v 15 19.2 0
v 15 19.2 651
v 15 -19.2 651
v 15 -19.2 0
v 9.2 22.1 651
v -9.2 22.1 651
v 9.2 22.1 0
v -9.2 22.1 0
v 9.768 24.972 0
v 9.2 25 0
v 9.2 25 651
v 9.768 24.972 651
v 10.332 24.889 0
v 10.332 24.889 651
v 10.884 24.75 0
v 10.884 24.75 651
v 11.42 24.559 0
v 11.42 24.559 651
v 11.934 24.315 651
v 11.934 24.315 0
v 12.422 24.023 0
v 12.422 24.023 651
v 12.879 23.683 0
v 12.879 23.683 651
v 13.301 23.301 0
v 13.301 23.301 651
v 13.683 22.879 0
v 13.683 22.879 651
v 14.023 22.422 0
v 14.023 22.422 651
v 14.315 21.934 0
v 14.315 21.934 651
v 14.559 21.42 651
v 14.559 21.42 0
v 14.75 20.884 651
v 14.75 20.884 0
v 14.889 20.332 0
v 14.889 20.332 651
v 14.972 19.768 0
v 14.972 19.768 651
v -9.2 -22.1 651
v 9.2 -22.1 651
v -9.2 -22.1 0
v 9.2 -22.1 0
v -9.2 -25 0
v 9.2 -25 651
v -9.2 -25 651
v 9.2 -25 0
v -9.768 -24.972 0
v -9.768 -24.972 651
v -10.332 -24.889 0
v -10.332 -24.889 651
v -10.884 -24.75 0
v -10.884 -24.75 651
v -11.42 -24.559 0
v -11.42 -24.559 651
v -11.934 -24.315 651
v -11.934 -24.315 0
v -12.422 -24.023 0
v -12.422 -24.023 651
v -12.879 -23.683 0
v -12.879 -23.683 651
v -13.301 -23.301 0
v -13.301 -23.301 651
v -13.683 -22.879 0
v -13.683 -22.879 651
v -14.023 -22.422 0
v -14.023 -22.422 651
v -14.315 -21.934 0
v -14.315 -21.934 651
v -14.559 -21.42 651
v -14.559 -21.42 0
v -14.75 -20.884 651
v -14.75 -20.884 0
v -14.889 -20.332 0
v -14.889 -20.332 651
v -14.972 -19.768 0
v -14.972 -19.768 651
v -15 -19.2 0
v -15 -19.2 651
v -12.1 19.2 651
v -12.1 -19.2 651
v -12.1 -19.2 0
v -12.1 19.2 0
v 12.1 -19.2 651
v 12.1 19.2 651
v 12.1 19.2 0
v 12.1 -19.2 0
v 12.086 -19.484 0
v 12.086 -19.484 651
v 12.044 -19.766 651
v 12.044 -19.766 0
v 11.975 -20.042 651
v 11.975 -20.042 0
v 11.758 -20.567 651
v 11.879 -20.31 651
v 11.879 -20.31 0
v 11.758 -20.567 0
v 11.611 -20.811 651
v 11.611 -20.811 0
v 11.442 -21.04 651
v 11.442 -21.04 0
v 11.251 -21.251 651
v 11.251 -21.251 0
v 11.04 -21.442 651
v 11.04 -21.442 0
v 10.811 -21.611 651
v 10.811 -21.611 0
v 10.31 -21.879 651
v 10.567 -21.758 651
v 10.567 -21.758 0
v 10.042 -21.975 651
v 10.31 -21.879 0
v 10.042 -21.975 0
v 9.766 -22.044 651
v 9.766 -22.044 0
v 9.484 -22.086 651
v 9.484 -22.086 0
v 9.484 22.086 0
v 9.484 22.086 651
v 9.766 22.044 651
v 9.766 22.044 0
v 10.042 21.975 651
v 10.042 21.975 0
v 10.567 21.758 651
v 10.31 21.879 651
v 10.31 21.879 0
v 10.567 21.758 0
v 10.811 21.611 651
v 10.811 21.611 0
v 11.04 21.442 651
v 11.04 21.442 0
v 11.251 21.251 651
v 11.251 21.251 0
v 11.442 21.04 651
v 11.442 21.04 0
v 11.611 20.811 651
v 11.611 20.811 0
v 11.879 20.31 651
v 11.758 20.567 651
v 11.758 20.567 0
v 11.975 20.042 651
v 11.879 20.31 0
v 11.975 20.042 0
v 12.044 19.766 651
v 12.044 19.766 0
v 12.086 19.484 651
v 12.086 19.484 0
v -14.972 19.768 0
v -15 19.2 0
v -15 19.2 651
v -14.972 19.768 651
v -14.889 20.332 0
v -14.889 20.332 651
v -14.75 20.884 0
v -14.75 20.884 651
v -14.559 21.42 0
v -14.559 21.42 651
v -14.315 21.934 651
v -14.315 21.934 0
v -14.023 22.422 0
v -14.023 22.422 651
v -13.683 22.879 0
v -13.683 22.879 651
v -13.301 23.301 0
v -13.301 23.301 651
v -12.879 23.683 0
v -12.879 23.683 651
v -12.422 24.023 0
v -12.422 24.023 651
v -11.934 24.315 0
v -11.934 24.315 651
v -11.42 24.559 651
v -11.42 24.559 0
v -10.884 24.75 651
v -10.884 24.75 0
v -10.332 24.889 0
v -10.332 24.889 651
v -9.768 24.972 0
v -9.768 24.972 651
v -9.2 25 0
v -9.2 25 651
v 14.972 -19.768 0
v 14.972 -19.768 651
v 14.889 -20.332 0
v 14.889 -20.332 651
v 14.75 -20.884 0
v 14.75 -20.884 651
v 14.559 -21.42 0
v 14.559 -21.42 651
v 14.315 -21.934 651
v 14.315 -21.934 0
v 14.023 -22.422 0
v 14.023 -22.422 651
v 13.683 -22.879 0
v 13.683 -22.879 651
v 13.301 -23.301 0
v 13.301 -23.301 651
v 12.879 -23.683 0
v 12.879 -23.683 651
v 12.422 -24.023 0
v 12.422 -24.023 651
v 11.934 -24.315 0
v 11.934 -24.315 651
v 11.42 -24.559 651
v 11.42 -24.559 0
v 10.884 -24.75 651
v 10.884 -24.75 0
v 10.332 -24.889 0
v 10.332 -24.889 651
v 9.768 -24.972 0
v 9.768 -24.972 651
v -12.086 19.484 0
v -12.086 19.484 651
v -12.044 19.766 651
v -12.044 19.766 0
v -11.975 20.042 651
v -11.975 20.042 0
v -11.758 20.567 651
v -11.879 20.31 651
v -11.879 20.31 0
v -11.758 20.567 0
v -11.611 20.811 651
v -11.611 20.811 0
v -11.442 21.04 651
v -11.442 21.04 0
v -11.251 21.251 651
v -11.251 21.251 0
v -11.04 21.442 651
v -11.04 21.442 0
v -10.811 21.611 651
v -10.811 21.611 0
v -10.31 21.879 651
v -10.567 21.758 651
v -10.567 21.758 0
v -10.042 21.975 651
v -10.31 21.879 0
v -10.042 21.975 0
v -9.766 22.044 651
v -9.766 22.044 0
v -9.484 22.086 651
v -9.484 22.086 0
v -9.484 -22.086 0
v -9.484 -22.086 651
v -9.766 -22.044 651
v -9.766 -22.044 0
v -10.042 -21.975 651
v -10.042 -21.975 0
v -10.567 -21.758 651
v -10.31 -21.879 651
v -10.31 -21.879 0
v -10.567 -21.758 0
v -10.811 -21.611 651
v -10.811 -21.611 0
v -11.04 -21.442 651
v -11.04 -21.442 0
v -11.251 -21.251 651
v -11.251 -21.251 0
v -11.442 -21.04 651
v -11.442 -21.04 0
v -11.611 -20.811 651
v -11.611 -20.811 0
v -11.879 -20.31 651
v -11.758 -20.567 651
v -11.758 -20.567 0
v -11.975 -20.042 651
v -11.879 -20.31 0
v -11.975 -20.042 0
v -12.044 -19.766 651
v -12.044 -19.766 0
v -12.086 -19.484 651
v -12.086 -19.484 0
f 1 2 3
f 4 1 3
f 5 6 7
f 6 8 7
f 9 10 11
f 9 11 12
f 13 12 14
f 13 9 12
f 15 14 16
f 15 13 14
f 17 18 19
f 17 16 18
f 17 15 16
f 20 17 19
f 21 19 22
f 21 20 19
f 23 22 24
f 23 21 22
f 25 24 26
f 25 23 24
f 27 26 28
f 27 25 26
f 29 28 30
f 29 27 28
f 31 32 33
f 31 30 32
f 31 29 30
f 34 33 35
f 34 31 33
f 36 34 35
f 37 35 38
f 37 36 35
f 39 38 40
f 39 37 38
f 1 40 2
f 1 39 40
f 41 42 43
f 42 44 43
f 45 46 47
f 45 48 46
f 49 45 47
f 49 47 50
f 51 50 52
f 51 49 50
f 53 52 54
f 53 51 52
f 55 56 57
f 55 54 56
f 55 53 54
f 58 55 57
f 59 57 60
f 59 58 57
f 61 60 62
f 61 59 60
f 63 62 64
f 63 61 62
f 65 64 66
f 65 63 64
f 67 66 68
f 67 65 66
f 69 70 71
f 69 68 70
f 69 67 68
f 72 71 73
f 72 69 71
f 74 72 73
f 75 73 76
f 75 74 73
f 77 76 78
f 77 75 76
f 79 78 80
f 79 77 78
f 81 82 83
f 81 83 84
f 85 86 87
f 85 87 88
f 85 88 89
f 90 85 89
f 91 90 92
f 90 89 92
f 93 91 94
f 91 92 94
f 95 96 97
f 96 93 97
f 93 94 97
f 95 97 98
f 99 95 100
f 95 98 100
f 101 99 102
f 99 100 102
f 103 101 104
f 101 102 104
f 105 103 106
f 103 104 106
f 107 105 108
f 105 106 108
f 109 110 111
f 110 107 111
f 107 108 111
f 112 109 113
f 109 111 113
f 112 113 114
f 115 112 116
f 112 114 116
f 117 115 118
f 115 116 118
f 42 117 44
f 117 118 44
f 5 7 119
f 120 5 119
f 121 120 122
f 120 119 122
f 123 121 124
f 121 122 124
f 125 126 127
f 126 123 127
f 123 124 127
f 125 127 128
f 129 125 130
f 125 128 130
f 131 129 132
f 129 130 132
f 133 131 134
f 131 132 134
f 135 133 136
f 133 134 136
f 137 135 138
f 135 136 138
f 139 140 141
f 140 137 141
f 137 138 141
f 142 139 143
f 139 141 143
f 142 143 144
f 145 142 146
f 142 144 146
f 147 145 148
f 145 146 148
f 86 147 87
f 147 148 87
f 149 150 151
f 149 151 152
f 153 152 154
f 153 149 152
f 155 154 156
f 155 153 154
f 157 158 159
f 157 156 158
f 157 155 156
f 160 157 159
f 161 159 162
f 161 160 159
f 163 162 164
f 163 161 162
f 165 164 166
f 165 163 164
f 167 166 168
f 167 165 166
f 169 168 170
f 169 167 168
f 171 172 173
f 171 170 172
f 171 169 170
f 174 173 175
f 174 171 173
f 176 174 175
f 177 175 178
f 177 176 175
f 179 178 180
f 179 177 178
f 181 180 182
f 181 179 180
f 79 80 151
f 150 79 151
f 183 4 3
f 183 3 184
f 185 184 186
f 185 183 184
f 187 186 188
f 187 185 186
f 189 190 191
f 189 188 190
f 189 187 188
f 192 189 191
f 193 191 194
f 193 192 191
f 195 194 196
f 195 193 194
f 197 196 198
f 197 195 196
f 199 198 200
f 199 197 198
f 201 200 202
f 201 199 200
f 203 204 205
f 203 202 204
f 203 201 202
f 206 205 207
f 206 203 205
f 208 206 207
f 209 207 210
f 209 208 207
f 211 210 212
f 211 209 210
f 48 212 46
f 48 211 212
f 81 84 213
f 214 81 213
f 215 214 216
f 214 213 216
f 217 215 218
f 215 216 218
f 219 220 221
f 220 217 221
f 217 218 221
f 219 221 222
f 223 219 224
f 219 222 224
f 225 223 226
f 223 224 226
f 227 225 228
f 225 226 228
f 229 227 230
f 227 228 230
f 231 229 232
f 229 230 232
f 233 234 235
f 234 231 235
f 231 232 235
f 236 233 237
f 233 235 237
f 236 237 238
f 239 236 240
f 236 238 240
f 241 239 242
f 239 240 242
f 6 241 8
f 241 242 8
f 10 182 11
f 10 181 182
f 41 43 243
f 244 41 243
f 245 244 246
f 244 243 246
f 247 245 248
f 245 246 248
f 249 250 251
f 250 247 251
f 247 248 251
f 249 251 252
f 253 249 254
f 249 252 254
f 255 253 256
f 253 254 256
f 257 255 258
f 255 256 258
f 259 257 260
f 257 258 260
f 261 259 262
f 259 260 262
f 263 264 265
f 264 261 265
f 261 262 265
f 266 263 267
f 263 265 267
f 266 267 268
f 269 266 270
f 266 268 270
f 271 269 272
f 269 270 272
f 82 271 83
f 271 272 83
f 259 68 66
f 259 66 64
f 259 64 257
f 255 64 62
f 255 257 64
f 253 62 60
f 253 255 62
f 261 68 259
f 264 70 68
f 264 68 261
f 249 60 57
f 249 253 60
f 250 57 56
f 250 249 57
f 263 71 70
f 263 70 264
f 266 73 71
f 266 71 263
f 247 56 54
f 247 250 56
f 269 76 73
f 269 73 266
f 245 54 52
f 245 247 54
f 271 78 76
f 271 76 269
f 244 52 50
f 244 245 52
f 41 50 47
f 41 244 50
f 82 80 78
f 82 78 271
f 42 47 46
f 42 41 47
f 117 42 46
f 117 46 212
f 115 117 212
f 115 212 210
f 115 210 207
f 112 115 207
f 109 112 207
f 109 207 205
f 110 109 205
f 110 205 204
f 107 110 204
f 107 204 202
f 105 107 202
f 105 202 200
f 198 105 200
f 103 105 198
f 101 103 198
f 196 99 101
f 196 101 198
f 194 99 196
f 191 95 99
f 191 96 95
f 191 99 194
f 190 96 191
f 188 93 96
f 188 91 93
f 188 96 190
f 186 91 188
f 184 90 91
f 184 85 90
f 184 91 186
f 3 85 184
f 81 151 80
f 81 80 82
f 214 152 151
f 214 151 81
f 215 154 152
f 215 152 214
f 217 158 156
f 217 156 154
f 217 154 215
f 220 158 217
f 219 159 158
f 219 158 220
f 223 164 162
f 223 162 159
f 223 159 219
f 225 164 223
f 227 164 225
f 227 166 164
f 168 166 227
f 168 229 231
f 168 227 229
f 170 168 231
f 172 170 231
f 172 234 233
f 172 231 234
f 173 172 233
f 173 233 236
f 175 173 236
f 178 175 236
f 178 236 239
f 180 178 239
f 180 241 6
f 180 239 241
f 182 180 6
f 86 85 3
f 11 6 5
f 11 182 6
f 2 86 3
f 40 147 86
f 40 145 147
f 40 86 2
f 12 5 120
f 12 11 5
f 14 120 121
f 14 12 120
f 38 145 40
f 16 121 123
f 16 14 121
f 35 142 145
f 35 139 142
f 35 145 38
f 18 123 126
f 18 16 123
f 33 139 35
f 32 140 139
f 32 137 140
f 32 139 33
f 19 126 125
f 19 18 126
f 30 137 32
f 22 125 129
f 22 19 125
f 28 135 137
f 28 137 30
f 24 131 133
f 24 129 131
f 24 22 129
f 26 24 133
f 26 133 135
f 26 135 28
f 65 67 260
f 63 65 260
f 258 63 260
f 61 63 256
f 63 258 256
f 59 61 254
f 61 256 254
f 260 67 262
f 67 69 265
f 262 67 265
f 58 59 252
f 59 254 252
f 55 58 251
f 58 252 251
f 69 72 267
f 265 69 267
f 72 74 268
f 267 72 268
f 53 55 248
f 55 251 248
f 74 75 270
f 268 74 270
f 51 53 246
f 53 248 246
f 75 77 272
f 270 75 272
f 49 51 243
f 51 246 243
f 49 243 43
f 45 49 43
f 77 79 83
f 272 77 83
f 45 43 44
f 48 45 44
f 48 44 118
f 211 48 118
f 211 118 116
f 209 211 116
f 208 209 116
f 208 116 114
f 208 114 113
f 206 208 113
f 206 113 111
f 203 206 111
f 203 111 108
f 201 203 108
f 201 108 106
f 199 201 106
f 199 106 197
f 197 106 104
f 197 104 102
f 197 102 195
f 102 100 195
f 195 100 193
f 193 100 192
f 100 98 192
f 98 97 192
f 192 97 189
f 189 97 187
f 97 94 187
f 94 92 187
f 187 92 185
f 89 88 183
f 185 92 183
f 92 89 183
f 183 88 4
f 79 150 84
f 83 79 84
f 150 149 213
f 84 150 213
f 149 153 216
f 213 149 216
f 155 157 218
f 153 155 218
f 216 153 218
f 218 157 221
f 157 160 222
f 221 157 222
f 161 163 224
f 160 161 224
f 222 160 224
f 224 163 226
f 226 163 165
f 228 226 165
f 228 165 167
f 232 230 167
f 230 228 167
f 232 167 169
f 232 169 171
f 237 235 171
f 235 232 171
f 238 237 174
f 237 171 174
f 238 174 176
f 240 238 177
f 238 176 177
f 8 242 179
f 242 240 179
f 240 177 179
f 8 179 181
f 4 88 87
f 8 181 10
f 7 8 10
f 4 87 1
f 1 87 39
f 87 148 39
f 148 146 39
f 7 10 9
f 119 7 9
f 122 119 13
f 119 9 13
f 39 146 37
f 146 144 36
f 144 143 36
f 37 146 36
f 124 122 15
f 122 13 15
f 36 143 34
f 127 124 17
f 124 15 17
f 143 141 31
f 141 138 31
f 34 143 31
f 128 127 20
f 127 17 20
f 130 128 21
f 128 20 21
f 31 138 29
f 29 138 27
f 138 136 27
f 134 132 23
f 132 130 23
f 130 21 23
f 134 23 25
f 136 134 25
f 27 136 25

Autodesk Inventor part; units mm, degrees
ref_plane "YZ Plane" through (0, 0, 0) normal (1, 0, 0) x (0, 1, 0)
ref_plane "Start plane" through (0, 0, 0) normal (0, 0, 1) x (1, 0, 0)
ref_plane "End plane" through (0, 0, 651) normal (0, 0, 1) x (1, 0, 0)
sketch "Sketch" plane through (0, 0, 0) normal (0, 0, 1) x (1, 0, 0)
  line L0 (-9.2, 25) -> (9.2, 25)
  line L1 (15, 19.2) -> (15, -19.2)
  line L2 (9.2, -25) -> (-9.2, -25)
  line L3 (-15, -19.2) -> (-15, 19.2)
  arc A0 (-9.2, 25) -> (-15, 19.2) centre (-9.2, 19.2) ccw
  arc A1 (15, 19.2) -> (9.2, 25) centre (9.2, 19.2) ccw
  arc A2 (9.2, -25) -> (15, -19.2) centre (9.2, -19.2) ccw
  arc A3 (-15, -19.2) -> (-9.2, -25) centre (-9.2, -19.2) ccw
  line L4 (-22.6817, 0) -> (22.6817, 0) construction
  line L5 (0, -36.6817) -> (0, 36.6817) construction
  arc A4 (-9.2, 22.1) -> (-12.1, 19.2) centre (-9.2, 19.2) ccw
  line L6 (-9.2, 22.1) -> (9.2, 22.1)
  arc A5 (12.1, 19.2) -> (9.2, 22.1) centre (9.2, 19.2) ccw
  line L7 (12.1, 19.2) -> (12.1, -19.2)
  arc A6 (9.2, -22.1) -> (12.1, -19.2) centre (9.2, -19.2) ccw
  line L8 (9.2, -22.1) -> (-9.2, -22.1)
  arc A7 (-12.1, -19.2) -> (-9.2, -22.1) centre (-9.2, -19.2) ccw
  line L9 (-12.1, -19.2) -> (-12.1, 19.2)
  point P0 (-15, 25)
  point P1 (15, -25)
  point P2 (15, 25)
  dimension "b" = 30
  dimension "ParH" = 50
  dimension "msp_r" = 5.8
  dimension "d8" = 15
  dimension "d9" = 25
  dimension "d10" = 2.9
extrude "Body" add sketch "Sketch" along normal up to surface (651 mm away) from surface at 0
sketch "Sketch2" plane through (0, 0, 0) normal (0, 0, 1) x (1, 0, 0)
  line L0 (0, 0) -> (10, 0)
ref_plane "Work Plane3" through (0, 0, 0) normal (0, -1, 0) x (1, 0, 0)
sketch "Sketch3" plane through (0, 0, 0) normal (0, -1, 0) x (1, 0, 0)
  line L0 (-2, 0) -> (12, 0)
  line L1 (-2, 651) -> (12, 651)
  dimension "d14" = 651
equation "\"msp_r\" = 2 * ParT"
equation "\"d8\" = 0.5 * b"
equation "\"d9\" = 0.5 * ParH"
equation "\"d10\" = ParT"
equation "\"G_OFFSET_START\" = 0"
equation "\"G_OFFSET_END\" = 0"
equation "\"d12\" = G_OFFSET_END + B_L"
equation "\"G_L\" = d14"
equation "\"B_L\" = 651"
equation "\"ParT\" = 2.9"
properties part number "DIN 59 410 - 50x30x2.9-651" material "Steel, Mild"
